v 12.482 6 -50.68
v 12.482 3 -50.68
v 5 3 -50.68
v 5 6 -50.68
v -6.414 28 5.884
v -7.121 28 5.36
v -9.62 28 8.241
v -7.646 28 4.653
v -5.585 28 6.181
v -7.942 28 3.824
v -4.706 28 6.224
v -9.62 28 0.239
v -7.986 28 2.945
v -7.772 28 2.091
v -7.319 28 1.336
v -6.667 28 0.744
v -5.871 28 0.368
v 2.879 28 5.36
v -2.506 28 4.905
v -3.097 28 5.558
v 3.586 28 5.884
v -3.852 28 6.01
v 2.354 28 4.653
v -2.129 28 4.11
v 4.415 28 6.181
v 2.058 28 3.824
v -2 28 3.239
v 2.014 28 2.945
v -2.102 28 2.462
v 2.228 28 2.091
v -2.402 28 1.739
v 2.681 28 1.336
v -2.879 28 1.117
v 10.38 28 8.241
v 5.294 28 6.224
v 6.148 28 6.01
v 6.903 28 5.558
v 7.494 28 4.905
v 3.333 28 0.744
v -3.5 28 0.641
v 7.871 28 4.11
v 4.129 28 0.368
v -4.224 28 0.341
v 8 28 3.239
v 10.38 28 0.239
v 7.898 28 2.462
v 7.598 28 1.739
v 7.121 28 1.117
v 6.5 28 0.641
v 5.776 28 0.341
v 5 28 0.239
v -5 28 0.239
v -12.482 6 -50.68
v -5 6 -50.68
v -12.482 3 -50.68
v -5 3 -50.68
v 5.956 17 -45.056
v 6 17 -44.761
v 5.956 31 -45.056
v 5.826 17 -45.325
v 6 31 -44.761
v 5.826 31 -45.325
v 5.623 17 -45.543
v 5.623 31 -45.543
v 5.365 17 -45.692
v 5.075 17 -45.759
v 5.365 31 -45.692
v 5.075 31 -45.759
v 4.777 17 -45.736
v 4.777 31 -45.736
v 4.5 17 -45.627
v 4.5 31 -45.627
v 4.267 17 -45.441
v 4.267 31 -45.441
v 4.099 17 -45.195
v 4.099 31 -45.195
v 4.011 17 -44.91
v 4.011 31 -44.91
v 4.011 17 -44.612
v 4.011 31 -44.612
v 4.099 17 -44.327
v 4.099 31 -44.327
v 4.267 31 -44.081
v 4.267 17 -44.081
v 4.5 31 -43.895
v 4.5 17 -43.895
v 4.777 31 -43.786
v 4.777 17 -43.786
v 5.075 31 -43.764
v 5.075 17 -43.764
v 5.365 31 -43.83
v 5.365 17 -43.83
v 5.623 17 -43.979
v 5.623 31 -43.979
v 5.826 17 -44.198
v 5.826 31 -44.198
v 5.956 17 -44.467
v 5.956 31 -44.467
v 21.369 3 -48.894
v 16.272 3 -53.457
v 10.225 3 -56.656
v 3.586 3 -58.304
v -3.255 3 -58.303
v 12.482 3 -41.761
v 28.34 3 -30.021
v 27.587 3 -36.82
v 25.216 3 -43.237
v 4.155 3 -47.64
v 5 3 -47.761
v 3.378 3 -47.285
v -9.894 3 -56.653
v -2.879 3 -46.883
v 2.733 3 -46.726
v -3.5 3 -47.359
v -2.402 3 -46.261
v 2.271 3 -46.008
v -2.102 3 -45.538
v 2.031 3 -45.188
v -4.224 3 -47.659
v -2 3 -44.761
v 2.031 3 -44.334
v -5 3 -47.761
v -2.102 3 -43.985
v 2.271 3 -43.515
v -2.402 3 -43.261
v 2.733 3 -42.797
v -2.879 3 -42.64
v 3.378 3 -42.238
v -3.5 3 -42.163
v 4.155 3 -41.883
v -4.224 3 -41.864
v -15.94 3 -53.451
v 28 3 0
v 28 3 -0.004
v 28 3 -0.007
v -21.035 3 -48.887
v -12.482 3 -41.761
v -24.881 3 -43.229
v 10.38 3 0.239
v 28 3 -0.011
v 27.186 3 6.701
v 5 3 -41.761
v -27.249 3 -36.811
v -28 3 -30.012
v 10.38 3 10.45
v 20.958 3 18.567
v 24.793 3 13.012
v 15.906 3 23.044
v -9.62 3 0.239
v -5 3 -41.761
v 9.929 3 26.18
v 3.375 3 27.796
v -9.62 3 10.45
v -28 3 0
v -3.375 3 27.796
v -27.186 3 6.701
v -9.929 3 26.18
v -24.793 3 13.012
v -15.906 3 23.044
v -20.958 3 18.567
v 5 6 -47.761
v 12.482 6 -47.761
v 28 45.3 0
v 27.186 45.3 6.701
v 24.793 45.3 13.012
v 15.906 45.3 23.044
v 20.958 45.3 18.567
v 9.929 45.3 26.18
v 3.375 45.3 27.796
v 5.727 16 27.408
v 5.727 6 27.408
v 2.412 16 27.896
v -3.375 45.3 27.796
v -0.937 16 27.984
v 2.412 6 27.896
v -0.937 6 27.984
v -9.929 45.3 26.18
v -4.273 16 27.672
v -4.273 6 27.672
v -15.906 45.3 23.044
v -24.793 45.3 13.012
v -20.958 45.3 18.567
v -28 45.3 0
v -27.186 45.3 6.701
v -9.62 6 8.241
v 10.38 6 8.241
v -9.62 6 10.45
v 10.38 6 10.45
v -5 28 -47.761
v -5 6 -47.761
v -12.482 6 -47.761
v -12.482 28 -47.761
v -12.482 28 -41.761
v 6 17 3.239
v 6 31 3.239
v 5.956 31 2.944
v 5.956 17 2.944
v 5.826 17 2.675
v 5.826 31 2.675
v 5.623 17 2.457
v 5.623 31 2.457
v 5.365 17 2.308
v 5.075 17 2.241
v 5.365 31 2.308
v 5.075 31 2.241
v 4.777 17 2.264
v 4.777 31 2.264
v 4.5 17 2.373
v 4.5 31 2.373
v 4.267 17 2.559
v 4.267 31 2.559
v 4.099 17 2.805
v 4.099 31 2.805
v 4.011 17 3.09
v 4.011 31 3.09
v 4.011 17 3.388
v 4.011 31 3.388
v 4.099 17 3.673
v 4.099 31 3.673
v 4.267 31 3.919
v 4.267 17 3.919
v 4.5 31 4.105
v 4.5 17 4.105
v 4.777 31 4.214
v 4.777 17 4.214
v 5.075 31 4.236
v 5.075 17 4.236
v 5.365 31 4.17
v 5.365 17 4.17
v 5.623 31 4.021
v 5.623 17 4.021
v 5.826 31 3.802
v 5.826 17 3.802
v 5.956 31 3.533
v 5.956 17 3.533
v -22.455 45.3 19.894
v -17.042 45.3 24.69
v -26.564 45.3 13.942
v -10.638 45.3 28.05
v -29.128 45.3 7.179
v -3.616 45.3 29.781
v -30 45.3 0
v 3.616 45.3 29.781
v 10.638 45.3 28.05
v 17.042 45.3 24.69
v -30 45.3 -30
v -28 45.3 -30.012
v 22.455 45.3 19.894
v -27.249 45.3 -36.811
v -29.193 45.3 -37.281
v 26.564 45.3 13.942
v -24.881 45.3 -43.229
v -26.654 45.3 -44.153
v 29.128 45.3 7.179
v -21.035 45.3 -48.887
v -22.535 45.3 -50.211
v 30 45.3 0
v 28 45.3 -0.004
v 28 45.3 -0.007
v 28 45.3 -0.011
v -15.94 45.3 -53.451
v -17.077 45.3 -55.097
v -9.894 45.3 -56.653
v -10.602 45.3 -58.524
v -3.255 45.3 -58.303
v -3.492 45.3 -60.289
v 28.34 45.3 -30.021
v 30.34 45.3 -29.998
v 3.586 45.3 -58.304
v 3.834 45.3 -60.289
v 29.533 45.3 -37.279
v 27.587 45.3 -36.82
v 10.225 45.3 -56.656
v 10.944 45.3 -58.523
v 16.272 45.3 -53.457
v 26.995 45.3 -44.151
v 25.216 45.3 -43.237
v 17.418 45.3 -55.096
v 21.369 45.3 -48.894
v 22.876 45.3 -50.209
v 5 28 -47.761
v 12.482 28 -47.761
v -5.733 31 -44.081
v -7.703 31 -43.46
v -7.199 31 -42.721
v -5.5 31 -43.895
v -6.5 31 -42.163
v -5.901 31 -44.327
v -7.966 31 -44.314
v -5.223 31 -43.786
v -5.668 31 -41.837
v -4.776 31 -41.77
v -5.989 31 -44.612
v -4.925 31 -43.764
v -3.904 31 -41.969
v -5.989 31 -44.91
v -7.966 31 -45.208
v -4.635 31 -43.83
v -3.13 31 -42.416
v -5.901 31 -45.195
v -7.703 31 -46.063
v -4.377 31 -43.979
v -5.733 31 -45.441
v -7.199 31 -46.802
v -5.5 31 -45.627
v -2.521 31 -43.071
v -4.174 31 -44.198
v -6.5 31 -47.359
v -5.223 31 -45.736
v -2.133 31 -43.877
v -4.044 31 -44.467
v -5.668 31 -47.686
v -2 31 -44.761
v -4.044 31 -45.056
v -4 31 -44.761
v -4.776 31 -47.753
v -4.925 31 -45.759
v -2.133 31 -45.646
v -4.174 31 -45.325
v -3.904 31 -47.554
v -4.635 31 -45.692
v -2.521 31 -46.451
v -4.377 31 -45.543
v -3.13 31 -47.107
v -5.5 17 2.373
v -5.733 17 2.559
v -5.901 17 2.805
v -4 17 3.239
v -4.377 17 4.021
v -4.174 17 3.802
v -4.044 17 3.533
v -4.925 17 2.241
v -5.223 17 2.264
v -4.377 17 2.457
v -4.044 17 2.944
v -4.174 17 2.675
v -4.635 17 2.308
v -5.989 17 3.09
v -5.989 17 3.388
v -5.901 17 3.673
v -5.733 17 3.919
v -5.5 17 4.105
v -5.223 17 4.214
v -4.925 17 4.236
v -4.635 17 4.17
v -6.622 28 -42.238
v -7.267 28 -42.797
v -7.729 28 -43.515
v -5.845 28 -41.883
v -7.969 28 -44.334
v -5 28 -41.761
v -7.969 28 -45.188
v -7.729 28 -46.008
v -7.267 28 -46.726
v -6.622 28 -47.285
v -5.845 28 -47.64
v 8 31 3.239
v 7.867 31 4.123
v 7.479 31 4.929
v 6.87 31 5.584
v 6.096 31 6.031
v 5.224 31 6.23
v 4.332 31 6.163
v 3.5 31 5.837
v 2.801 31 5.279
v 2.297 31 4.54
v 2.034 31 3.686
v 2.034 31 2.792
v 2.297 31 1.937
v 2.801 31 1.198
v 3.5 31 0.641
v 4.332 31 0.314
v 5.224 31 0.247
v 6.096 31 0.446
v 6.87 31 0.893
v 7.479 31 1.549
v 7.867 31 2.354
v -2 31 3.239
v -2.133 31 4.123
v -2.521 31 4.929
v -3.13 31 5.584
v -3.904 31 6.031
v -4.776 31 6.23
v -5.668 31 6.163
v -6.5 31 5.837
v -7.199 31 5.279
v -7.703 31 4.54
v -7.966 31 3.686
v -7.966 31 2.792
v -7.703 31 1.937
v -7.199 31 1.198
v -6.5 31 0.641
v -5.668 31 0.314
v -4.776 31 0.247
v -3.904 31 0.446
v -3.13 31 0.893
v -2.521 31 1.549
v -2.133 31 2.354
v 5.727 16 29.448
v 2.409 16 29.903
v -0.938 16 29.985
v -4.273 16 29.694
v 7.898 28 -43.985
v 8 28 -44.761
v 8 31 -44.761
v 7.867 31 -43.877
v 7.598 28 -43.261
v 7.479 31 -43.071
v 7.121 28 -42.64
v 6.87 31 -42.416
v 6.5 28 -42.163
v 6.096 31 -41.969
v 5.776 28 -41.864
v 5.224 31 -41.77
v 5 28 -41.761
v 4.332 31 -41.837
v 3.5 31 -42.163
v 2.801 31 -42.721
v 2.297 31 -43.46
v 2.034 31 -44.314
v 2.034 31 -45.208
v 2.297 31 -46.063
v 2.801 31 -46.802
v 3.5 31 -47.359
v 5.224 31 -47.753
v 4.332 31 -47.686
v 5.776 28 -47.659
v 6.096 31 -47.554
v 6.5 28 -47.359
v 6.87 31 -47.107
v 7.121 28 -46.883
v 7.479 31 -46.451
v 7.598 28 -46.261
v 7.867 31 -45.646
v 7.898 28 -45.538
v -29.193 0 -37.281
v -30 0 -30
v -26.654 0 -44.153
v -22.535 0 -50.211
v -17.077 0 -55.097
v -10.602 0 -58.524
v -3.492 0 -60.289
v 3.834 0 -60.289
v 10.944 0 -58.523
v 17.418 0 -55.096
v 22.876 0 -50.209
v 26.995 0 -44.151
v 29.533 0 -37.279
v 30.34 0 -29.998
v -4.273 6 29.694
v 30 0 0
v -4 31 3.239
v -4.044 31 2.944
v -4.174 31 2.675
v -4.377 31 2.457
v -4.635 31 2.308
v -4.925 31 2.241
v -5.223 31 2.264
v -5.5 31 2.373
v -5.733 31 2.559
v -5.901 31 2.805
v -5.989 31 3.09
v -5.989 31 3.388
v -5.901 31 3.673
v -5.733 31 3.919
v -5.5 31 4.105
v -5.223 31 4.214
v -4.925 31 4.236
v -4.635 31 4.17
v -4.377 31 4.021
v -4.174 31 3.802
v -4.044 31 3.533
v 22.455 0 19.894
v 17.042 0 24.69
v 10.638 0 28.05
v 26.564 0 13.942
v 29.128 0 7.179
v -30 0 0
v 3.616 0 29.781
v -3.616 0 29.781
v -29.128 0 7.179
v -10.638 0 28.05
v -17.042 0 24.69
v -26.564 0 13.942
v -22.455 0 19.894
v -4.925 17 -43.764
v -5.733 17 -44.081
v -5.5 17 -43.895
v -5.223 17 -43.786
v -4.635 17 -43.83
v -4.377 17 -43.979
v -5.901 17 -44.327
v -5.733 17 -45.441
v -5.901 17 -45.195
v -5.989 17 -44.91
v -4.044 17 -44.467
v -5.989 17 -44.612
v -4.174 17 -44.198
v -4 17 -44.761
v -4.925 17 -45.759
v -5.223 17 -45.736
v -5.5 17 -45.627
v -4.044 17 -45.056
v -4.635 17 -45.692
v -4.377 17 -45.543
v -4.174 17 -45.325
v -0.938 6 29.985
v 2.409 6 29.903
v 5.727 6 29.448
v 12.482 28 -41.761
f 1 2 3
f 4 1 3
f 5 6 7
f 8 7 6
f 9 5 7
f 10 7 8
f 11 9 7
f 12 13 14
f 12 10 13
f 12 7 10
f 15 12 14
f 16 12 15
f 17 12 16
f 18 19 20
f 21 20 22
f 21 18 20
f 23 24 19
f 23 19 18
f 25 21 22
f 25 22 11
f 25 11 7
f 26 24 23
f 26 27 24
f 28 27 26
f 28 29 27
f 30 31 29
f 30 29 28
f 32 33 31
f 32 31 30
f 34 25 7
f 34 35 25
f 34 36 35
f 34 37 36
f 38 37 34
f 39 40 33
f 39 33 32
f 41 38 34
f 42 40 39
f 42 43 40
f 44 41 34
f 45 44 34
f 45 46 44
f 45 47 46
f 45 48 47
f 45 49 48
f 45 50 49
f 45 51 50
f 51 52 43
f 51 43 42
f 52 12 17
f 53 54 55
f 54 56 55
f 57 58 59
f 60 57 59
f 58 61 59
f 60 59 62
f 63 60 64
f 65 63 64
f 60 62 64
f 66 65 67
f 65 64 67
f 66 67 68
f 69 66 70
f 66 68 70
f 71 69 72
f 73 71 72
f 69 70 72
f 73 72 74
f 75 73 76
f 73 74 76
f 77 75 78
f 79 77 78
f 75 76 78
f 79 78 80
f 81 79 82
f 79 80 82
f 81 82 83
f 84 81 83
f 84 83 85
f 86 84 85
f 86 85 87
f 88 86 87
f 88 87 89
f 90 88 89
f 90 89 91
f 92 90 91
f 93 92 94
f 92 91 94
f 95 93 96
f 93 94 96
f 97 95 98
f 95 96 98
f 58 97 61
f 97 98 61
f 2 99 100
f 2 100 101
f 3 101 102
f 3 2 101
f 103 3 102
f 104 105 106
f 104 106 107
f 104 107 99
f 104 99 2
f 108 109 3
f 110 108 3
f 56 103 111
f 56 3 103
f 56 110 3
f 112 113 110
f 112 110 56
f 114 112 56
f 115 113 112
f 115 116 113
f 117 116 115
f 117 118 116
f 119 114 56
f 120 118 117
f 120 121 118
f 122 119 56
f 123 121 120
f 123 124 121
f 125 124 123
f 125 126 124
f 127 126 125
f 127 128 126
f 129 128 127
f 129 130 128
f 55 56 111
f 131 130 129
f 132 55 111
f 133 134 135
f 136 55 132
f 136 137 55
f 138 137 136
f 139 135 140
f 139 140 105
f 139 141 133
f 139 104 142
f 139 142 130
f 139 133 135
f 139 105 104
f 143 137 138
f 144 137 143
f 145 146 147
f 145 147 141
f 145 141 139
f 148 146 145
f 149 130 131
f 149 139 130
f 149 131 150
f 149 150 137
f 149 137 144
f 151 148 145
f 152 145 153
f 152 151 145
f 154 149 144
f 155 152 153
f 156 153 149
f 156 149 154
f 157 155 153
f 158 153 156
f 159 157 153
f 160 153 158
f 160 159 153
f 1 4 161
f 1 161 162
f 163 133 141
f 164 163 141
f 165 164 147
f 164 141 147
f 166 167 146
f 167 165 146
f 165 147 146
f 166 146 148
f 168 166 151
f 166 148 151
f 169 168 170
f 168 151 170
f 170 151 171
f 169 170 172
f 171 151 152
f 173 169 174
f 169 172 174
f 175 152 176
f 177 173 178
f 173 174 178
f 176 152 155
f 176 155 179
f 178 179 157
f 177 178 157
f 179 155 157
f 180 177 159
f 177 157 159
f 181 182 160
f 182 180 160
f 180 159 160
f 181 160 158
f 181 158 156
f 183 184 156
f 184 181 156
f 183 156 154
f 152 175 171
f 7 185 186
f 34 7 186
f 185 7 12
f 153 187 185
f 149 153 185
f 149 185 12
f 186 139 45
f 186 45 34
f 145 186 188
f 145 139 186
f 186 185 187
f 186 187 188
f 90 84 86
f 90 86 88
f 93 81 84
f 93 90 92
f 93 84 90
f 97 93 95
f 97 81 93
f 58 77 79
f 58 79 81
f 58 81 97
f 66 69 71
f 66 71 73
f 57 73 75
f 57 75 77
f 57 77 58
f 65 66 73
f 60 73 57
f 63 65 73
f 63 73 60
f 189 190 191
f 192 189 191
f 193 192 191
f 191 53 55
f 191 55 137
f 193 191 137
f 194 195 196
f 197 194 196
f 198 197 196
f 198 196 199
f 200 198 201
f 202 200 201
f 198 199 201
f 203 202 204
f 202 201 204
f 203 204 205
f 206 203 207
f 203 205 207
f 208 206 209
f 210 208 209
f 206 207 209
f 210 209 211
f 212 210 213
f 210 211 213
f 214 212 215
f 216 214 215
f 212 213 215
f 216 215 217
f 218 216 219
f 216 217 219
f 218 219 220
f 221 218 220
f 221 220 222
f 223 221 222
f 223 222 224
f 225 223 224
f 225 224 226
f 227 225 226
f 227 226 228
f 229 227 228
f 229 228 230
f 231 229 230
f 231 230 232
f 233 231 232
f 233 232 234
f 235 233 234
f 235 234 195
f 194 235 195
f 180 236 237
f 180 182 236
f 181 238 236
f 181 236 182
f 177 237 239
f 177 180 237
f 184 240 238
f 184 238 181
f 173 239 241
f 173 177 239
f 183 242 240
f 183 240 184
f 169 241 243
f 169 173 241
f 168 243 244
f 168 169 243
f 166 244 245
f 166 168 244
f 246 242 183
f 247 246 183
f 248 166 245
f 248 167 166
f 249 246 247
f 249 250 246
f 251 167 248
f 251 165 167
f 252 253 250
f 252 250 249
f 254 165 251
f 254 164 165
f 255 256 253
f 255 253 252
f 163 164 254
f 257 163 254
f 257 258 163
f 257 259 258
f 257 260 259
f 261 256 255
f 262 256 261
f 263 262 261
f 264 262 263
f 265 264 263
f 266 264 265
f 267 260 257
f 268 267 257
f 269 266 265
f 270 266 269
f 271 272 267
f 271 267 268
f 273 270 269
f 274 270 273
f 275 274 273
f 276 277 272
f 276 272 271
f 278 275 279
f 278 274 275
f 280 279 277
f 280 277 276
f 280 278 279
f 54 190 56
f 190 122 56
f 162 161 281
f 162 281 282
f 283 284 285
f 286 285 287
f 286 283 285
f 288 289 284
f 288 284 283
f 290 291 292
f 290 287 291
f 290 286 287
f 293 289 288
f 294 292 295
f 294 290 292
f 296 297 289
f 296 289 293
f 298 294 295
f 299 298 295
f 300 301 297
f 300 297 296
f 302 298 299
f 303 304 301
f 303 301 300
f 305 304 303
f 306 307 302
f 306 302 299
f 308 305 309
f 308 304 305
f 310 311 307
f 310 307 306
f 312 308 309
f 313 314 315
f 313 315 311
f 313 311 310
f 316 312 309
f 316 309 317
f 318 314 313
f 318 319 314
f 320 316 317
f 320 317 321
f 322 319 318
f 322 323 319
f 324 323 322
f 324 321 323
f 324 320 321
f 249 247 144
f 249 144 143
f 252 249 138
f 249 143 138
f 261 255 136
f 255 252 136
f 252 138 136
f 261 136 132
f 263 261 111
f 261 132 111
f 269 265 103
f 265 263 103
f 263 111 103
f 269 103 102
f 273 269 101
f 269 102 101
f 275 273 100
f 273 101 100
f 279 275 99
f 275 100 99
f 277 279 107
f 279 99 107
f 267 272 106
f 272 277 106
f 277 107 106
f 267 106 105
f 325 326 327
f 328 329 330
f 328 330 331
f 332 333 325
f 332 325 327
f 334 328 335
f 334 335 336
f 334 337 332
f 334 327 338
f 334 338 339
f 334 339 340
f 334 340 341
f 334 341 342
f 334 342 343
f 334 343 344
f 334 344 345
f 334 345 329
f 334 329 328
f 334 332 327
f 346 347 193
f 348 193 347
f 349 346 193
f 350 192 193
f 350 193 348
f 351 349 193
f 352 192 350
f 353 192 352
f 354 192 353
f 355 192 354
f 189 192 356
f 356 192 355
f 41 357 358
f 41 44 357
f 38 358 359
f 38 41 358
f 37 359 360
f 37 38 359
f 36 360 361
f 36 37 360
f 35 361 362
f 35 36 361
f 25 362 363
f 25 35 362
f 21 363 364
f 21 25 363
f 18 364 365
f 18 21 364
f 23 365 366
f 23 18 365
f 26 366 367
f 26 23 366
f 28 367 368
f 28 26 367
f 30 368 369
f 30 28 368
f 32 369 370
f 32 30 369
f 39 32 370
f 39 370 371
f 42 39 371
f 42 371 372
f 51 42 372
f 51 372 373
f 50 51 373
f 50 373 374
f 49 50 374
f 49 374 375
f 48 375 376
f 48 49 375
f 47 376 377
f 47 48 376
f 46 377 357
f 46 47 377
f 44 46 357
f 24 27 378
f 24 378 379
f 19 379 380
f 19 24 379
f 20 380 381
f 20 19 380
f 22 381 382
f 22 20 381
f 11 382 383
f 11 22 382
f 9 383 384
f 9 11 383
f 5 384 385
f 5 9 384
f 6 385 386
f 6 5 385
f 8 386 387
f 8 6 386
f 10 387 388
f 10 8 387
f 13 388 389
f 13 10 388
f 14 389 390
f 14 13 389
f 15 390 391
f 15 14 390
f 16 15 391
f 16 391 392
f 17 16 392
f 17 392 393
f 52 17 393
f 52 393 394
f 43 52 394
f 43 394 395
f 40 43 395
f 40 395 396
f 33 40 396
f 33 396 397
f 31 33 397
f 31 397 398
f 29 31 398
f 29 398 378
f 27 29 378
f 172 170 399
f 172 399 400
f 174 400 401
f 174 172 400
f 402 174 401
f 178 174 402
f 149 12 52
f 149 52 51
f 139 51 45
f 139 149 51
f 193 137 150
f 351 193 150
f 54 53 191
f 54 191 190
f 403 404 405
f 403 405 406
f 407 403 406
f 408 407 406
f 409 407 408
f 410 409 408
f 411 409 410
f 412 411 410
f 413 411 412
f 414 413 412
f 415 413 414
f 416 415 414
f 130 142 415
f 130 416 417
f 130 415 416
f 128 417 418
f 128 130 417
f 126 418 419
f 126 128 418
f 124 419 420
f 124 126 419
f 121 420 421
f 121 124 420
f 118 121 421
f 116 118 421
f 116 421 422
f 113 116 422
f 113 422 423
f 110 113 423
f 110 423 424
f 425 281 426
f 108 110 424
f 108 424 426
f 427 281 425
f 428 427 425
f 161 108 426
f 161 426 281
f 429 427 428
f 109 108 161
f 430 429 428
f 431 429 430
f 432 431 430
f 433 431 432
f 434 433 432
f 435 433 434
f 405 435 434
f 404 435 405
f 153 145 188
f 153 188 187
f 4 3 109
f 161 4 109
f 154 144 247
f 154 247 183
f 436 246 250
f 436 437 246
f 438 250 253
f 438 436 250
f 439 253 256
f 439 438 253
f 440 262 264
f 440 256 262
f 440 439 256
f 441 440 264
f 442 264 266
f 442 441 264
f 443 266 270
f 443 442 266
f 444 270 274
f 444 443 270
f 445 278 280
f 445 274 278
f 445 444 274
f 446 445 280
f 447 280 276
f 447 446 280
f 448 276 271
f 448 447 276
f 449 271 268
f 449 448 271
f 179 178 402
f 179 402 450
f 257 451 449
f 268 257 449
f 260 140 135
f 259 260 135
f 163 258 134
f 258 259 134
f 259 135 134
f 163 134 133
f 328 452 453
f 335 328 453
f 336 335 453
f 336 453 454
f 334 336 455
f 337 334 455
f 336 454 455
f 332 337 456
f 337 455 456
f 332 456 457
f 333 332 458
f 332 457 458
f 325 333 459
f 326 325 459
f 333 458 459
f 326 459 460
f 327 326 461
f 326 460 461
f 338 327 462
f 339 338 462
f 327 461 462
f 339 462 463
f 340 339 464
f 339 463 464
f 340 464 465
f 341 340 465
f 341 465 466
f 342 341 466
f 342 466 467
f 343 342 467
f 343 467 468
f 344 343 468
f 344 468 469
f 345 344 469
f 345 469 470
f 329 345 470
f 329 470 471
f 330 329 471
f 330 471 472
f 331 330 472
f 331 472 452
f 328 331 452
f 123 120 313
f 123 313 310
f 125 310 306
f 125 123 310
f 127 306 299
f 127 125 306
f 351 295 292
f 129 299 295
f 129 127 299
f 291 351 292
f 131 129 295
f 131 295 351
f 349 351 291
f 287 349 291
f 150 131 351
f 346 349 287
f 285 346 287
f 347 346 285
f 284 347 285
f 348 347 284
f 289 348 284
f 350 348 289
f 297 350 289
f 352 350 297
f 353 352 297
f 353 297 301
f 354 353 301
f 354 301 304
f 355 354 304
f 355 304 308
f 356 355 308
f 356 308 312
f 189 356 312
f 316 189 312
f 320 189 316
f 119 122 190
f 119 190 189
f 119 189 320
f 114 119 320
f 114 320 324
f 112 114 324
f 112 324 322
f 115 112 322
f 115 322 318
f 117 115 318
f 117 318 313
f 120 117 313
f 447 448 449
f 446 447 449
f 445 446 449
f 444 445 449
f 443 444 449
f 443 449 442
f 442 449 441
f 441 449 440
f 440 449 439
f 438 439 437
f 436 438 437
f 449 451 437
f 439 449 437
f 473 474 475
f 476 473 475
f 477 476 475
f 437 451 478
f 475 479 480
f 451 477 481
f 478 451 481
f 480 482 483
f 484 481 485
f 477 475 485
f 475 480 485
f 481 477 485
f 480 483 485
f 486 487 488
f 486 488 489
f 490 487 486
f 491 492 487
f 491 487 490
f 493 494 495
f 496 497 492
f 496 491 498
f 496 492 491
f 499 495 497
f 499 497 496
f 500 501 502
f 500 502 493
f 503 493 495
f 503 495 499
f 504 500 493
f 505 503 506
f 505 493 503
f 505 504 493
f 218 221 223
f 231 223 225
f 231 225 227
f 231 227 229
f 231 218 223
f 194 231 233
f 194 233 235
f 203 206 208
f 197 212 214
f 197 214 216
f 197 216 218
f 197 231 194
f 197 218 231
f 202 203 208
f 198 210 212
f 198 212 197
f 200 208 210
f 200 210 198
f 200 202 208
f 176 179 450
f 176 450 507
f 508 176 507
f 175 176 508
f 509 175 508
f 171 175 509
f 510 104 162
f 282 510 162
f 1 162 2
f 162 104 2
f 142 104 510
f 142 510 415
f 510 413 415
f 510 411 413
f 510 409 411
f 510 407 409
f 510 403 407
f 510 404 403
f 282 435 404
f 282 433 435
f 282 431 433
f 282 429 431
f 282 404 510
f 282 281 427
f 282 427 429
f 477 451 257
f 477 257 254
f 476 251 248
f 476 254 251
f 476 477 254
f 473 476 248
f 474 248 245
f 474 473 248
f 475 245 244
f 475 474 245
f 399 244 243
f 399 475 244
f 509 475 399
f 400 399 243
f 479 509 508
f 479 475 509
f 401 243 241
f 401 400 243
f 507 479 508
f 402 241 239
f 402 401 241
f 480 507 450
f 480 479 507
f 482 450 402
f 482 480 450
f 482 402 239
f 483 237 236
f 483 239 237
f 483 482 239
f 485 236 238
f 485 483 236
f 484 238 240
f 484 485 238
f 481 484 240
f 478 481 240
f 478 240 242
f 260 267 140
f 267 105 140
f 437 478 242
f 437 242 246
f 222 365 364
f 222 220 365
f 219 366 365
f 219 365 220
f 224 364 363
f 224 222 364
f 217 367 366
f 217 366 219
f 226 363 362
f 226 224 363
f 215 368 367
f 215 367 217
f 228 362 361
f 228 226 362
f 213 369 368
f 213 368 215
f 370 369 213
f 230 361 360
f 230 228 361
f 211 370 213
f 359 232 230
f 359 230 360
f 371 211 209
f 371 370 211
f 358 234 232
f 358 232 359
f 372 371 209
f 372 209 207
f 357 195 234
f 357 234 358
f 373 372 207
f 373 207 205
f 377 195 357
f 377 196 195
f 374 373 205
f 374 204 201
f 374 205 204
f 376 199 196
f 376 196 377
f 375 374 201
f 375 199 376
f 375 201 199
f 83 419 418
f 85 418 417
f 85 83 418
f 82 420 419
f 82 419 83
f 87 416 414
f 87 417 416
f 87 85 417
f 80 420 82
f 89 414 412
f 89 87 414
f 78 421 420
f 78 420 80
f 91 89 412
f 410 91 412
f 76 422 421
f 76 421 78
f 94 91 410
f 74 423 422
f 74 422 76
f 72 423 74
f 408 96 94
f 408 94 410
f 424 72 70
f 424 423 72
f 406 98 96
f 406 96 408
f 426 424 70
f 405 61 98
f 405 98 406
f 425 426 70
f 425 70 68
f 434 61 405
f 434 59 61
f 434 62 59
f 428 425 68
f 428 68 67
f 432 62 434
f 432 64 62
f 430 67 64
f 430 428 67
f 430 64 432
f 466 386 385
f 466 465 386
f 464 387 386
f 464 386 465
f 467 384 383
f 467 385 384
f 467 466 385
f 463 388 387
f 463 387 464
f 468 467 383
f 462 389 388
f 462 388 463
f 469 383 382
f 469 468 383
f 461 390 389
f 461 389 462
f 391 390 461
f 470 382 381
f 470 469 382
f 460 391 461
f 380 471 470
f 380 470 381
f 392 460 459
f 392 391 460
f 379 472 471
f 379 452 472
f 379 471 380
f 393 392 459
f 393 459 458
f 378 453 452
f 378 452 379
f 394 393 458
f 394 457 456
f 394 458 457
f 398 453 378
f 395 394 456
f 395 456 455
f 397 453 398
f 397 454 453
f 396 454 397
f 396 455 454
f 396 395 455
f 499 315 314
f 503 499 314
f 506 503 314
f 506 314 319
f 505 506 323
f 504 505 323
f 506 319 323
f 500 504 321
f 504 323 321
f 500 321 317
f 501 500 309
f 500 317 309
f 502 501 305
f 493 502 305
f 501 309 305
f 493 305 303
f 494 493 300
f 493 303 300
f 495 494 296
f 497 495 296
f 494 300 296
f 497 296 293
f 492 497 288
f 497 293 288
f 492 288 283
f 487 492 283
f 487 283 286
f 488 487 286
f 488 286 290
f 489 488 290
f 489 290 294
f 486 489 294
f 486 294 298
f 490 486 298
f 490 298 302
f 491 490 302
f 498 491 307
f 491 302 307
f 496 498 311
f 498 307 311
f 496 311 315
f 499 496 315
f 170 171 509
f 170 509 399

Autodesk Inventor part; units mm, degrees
ref_plane "YZ Plane" through (0, 0, 0) normal (1, 0, 0) x (0, 1, 0)
ref_plane "XZ Plane" through (0, 0, 0) normal (0, 1, 0) x (-1, 0, 0)
ref_plane "XY Plane" through (0, 0, 0) normal (0, 0, 1) x (1, 0, 0)
sketch "Sketch10" plane through (0, 0, 0) normal (0, 1, 0) x (-1, 0, 0)
  arc A0 (30, 0) -> (-30, 0) centre (0, 0) ccw
  line L0 (30, 0) -> (30, -30)
  line L1 (-30, 0) -> (-30.34, -29.9981)
  arc A1 (-30.34, -29.9981) -> (30, -30) centre (-0.17, -30.34) ccw
  point P0 (0, 30)
  point P1 (0, 30)
  dimension "d39" = 60
  dimension "d40" = 30
extrude "Extrusion10" add sketch "Sketch10" along normal blind 3
sketch "Sketch11" plane through (0, 3, 0) normal (0, 1, 0) x (1, 0, 0)
  arc A0 (-30, 0) -> (30, 0) centre (0, 0) ccw projected
  line L0 (-30, 30) -> (-30, 0) projected
  line L1 (30, 0) -> (30.34, 29.9981) projected
  arc A1 (30.34, 29.9981) -> (-30, 30) centre (0.17, 30.34) ccw projected
  line L2 (-30, 30) -> (-30, 0) projected
  arc A2 (-30, 0) -> (30, 0) centre (0, 0) ccw projected
  line L3 (-28, 30) -> (-28, 0)
  arc A3 (-28, 0) -> (28, 0) centre (0, 0) ccw
  arc A4 (28.3401, 30.0207) -> (-28, 30.0115) centre (0.17, 30.34) ccw
  line L4 (28.3401, 30.0207) -> (28, 0.0111)
  arc A5 (-28, 0) -> (28, 0.0111) centre (0, 0) ccw
  line L5 (-28, 0) -> (-28, 30.0115)
  point P0 (30, 0)
  point P1 (28, 0)
  dimension "d43" = 2
  dimension "d44" = 2
extrude "Extrusion11" add sketch "Sketch11" along normal blind 42.3
sketch "Sketch12" plane through (0, 3, 0) normal (0, 1, 0) x (1, 0, 0)
  line L0 (-5, -3.2387) -> (5, -3.2387)
  line L1 (5, -3.2387) -> (5, 44.7613)
  line L2 (5, 44.7613) -> (-5, 44.7613)
  line L3 (-5, 44.7613) -> (-5, -3.2387)
  line L4 (-5, -3.2387) -> (5, 44.7613) construction
  line L5 (5, -3.2387) -> (-5, 44.7613) construction
  circle A0 centre (-5, -3.2387) radius 3
  circle A1 centre (-5, 44.7613) radius 3
  circle A2 centre (5, 44.7613) radius 3
  circle A3 centre (5, -3.2387) radius 3
  point P0 (0, 0)
  point P1 (0, 20.7613)
  dimension "d47" = 10
  dimension "d48" = 48
  dimension "d49" = 6
  dimension "d50" = 6
  dimension "d51" = 6
  dimension "d52" = 6
extrude "Extrusion12" add sketch "Sketch12" along normal blind 28 contours L3 A0 L0 | L0 A0 L3 | A3 L1 L0 | L0 L1 A3 | A1 L2 L3 | L3 L2 A1 | A2 L2 L1 | L1 L2 A2
sketch "Sketch13" plane through (-5, 31, 3.2387) normal (0, 1, 0) x (1, 0, 0)
  circle A0 centre (0, 0) radius 3 projected
  circle A1 centre (10, 0) radius 3 projected
  circle A2 centre (0, 48) radius 3 projected
  circle A3 centre (10, 48) radius 3 projected
  circle A4 centre (0, 0) radius 1
  circle A5 centre (10, 0) radius 1
  circle A6 centre (0, 48) radius 1
  circle A7 centre (10, 48) radius 1
  point P0 (5, 3.2387)
  dimension "d55" = 2
  dimension "d56" = 2
  dimension "d57" = 2
  dimension "d58" = 2
extrude "Extrusion13" cut sketch "Sketch13" against normal blind 14 contours A4 | A5 | A6 | A7
sketch "Sketch14" plane through (0, 3, 0) normal (0, 1, 0) x (1, 0, 0)
  line L0 (-9.6197, -0.2387) -> (10.3803, -0.2387)
  circle A0 centre (5, -3.2387) radius 3 projected
  circle A1 centre (-5, -3.2387) radius 3 projected
  line L1 (-9.6197, -0.2387) -> (-9.6197, -8.2414)
  line L2 (-9.6197, -8.2414) -> (10.3803, -8.2414)
  line L3 (10.3803, -8.2414) -> (10.3803, -0.2387)
  circle A2 centre (-5, 44.7613) radius 3 projected
  line L4 (-5, 47.7613) -> (-12.4823, 47.7613)
  line L5 (-12.4823, 47.7613) -> (-12.4823, 41.7613)
  line L6 (-12.4823, 41.7613) -> (-5, 41.7613)
  line L7 (0, 27.9217) -> (0, 57.8155) construction
  line L8 (5, 47.7613) -> (12.4823, 47.7613)
  line L9 (12.4823, 47.7613) -> (12.4823, 41.7613)
  line L10 (12.4823, 41.7613) -> (5, 41.7613)
  arc A3 (5, 41.7613) -> (5, 47.7613) centre (5, 44.7613) ccw
  point P0 (0, 0)
  point P1 (5, -0.2387)
  point P2 (-5, -0.2387)
  point P3 (5, 44.7613)
  dimension "d61" = 20
extrude "Extrusion14" add sketch "Sketch14" along normal blind 25 contours L0 L3 L2 L1
extrude "Extrusion15" add sketch "Sketch14" along normal blind 25 contours A2 L6 L5 L4 | L8 L9 L10 A3
sketch "Sketch15" plane through (0, 3, 0) normal (0, 1, 0) x (1, 0, 0)
  line L0 (-12.4823, 47.7613) -> (-5, 47.7613) projected
  line L1 (-12.4823, 47.7613) -> (-5, 47.7613)
  line L2 (-5, 47.7613) -> (-5, 50.6795)
  line L3 (-5, 50.6795) -> (-12.4823, 50.6795)
  line L4 (-12.4823, 50.6795) -> (-12.4823, 47.7613)
  point P0 (0, 0)
extrude "Extrusion16" add sketch "Sketch15" along normal blind 3
mirror "Mirror2" about plane through (0, 0, 0) normal (1, 0, 0) of "Extrusion16"
sketch "Sketch16" plane through (0, 3, 0) normal (0, 1, 0) x (1, 0, 0)
  line L0 (10.3803, -8.2414) -> (-9.6197, -8.2414) projected
  line L1 (-9.6197, -8.2414) -> (10.3803, -8.2414)
  line L2 (10.3803, -8.2414) -> (10.3803, -10.45)
  line L3 (10.3803, -10.45) -> (-9.6197, -10.45)
  line L4 (-9.6197, -10.45) -> (-9.6197, -8.2414)
  point P0 (0, 0)
extrude "Extrusion17" add sketch "Sketch16" along normal blind 3
sketch "Sketch17" plane through (-9.6197, 28, 8.2414) normal (0, 0, 1) x (1, 0, 0)
  line L0 (0, -22) -> (20, -22) projected
  line L1 (5.3464, -22) -> (15.3464, -22)
  line L2 (15.3464, -22) -> (15.3464, -12)
  line L3 (15.3464, -12) -> (5.3464, -12)
  line L4 (5.3464, -12) -> (5.3464, -22)
  point P0 (9.6197, -28)
  dimension "d70" = 10
  dimension "d71" = 10
extrude "Extrusion18" cut sketch "Sketch17" along normal blind 34.75
properties part number "Base_3DPrint"
